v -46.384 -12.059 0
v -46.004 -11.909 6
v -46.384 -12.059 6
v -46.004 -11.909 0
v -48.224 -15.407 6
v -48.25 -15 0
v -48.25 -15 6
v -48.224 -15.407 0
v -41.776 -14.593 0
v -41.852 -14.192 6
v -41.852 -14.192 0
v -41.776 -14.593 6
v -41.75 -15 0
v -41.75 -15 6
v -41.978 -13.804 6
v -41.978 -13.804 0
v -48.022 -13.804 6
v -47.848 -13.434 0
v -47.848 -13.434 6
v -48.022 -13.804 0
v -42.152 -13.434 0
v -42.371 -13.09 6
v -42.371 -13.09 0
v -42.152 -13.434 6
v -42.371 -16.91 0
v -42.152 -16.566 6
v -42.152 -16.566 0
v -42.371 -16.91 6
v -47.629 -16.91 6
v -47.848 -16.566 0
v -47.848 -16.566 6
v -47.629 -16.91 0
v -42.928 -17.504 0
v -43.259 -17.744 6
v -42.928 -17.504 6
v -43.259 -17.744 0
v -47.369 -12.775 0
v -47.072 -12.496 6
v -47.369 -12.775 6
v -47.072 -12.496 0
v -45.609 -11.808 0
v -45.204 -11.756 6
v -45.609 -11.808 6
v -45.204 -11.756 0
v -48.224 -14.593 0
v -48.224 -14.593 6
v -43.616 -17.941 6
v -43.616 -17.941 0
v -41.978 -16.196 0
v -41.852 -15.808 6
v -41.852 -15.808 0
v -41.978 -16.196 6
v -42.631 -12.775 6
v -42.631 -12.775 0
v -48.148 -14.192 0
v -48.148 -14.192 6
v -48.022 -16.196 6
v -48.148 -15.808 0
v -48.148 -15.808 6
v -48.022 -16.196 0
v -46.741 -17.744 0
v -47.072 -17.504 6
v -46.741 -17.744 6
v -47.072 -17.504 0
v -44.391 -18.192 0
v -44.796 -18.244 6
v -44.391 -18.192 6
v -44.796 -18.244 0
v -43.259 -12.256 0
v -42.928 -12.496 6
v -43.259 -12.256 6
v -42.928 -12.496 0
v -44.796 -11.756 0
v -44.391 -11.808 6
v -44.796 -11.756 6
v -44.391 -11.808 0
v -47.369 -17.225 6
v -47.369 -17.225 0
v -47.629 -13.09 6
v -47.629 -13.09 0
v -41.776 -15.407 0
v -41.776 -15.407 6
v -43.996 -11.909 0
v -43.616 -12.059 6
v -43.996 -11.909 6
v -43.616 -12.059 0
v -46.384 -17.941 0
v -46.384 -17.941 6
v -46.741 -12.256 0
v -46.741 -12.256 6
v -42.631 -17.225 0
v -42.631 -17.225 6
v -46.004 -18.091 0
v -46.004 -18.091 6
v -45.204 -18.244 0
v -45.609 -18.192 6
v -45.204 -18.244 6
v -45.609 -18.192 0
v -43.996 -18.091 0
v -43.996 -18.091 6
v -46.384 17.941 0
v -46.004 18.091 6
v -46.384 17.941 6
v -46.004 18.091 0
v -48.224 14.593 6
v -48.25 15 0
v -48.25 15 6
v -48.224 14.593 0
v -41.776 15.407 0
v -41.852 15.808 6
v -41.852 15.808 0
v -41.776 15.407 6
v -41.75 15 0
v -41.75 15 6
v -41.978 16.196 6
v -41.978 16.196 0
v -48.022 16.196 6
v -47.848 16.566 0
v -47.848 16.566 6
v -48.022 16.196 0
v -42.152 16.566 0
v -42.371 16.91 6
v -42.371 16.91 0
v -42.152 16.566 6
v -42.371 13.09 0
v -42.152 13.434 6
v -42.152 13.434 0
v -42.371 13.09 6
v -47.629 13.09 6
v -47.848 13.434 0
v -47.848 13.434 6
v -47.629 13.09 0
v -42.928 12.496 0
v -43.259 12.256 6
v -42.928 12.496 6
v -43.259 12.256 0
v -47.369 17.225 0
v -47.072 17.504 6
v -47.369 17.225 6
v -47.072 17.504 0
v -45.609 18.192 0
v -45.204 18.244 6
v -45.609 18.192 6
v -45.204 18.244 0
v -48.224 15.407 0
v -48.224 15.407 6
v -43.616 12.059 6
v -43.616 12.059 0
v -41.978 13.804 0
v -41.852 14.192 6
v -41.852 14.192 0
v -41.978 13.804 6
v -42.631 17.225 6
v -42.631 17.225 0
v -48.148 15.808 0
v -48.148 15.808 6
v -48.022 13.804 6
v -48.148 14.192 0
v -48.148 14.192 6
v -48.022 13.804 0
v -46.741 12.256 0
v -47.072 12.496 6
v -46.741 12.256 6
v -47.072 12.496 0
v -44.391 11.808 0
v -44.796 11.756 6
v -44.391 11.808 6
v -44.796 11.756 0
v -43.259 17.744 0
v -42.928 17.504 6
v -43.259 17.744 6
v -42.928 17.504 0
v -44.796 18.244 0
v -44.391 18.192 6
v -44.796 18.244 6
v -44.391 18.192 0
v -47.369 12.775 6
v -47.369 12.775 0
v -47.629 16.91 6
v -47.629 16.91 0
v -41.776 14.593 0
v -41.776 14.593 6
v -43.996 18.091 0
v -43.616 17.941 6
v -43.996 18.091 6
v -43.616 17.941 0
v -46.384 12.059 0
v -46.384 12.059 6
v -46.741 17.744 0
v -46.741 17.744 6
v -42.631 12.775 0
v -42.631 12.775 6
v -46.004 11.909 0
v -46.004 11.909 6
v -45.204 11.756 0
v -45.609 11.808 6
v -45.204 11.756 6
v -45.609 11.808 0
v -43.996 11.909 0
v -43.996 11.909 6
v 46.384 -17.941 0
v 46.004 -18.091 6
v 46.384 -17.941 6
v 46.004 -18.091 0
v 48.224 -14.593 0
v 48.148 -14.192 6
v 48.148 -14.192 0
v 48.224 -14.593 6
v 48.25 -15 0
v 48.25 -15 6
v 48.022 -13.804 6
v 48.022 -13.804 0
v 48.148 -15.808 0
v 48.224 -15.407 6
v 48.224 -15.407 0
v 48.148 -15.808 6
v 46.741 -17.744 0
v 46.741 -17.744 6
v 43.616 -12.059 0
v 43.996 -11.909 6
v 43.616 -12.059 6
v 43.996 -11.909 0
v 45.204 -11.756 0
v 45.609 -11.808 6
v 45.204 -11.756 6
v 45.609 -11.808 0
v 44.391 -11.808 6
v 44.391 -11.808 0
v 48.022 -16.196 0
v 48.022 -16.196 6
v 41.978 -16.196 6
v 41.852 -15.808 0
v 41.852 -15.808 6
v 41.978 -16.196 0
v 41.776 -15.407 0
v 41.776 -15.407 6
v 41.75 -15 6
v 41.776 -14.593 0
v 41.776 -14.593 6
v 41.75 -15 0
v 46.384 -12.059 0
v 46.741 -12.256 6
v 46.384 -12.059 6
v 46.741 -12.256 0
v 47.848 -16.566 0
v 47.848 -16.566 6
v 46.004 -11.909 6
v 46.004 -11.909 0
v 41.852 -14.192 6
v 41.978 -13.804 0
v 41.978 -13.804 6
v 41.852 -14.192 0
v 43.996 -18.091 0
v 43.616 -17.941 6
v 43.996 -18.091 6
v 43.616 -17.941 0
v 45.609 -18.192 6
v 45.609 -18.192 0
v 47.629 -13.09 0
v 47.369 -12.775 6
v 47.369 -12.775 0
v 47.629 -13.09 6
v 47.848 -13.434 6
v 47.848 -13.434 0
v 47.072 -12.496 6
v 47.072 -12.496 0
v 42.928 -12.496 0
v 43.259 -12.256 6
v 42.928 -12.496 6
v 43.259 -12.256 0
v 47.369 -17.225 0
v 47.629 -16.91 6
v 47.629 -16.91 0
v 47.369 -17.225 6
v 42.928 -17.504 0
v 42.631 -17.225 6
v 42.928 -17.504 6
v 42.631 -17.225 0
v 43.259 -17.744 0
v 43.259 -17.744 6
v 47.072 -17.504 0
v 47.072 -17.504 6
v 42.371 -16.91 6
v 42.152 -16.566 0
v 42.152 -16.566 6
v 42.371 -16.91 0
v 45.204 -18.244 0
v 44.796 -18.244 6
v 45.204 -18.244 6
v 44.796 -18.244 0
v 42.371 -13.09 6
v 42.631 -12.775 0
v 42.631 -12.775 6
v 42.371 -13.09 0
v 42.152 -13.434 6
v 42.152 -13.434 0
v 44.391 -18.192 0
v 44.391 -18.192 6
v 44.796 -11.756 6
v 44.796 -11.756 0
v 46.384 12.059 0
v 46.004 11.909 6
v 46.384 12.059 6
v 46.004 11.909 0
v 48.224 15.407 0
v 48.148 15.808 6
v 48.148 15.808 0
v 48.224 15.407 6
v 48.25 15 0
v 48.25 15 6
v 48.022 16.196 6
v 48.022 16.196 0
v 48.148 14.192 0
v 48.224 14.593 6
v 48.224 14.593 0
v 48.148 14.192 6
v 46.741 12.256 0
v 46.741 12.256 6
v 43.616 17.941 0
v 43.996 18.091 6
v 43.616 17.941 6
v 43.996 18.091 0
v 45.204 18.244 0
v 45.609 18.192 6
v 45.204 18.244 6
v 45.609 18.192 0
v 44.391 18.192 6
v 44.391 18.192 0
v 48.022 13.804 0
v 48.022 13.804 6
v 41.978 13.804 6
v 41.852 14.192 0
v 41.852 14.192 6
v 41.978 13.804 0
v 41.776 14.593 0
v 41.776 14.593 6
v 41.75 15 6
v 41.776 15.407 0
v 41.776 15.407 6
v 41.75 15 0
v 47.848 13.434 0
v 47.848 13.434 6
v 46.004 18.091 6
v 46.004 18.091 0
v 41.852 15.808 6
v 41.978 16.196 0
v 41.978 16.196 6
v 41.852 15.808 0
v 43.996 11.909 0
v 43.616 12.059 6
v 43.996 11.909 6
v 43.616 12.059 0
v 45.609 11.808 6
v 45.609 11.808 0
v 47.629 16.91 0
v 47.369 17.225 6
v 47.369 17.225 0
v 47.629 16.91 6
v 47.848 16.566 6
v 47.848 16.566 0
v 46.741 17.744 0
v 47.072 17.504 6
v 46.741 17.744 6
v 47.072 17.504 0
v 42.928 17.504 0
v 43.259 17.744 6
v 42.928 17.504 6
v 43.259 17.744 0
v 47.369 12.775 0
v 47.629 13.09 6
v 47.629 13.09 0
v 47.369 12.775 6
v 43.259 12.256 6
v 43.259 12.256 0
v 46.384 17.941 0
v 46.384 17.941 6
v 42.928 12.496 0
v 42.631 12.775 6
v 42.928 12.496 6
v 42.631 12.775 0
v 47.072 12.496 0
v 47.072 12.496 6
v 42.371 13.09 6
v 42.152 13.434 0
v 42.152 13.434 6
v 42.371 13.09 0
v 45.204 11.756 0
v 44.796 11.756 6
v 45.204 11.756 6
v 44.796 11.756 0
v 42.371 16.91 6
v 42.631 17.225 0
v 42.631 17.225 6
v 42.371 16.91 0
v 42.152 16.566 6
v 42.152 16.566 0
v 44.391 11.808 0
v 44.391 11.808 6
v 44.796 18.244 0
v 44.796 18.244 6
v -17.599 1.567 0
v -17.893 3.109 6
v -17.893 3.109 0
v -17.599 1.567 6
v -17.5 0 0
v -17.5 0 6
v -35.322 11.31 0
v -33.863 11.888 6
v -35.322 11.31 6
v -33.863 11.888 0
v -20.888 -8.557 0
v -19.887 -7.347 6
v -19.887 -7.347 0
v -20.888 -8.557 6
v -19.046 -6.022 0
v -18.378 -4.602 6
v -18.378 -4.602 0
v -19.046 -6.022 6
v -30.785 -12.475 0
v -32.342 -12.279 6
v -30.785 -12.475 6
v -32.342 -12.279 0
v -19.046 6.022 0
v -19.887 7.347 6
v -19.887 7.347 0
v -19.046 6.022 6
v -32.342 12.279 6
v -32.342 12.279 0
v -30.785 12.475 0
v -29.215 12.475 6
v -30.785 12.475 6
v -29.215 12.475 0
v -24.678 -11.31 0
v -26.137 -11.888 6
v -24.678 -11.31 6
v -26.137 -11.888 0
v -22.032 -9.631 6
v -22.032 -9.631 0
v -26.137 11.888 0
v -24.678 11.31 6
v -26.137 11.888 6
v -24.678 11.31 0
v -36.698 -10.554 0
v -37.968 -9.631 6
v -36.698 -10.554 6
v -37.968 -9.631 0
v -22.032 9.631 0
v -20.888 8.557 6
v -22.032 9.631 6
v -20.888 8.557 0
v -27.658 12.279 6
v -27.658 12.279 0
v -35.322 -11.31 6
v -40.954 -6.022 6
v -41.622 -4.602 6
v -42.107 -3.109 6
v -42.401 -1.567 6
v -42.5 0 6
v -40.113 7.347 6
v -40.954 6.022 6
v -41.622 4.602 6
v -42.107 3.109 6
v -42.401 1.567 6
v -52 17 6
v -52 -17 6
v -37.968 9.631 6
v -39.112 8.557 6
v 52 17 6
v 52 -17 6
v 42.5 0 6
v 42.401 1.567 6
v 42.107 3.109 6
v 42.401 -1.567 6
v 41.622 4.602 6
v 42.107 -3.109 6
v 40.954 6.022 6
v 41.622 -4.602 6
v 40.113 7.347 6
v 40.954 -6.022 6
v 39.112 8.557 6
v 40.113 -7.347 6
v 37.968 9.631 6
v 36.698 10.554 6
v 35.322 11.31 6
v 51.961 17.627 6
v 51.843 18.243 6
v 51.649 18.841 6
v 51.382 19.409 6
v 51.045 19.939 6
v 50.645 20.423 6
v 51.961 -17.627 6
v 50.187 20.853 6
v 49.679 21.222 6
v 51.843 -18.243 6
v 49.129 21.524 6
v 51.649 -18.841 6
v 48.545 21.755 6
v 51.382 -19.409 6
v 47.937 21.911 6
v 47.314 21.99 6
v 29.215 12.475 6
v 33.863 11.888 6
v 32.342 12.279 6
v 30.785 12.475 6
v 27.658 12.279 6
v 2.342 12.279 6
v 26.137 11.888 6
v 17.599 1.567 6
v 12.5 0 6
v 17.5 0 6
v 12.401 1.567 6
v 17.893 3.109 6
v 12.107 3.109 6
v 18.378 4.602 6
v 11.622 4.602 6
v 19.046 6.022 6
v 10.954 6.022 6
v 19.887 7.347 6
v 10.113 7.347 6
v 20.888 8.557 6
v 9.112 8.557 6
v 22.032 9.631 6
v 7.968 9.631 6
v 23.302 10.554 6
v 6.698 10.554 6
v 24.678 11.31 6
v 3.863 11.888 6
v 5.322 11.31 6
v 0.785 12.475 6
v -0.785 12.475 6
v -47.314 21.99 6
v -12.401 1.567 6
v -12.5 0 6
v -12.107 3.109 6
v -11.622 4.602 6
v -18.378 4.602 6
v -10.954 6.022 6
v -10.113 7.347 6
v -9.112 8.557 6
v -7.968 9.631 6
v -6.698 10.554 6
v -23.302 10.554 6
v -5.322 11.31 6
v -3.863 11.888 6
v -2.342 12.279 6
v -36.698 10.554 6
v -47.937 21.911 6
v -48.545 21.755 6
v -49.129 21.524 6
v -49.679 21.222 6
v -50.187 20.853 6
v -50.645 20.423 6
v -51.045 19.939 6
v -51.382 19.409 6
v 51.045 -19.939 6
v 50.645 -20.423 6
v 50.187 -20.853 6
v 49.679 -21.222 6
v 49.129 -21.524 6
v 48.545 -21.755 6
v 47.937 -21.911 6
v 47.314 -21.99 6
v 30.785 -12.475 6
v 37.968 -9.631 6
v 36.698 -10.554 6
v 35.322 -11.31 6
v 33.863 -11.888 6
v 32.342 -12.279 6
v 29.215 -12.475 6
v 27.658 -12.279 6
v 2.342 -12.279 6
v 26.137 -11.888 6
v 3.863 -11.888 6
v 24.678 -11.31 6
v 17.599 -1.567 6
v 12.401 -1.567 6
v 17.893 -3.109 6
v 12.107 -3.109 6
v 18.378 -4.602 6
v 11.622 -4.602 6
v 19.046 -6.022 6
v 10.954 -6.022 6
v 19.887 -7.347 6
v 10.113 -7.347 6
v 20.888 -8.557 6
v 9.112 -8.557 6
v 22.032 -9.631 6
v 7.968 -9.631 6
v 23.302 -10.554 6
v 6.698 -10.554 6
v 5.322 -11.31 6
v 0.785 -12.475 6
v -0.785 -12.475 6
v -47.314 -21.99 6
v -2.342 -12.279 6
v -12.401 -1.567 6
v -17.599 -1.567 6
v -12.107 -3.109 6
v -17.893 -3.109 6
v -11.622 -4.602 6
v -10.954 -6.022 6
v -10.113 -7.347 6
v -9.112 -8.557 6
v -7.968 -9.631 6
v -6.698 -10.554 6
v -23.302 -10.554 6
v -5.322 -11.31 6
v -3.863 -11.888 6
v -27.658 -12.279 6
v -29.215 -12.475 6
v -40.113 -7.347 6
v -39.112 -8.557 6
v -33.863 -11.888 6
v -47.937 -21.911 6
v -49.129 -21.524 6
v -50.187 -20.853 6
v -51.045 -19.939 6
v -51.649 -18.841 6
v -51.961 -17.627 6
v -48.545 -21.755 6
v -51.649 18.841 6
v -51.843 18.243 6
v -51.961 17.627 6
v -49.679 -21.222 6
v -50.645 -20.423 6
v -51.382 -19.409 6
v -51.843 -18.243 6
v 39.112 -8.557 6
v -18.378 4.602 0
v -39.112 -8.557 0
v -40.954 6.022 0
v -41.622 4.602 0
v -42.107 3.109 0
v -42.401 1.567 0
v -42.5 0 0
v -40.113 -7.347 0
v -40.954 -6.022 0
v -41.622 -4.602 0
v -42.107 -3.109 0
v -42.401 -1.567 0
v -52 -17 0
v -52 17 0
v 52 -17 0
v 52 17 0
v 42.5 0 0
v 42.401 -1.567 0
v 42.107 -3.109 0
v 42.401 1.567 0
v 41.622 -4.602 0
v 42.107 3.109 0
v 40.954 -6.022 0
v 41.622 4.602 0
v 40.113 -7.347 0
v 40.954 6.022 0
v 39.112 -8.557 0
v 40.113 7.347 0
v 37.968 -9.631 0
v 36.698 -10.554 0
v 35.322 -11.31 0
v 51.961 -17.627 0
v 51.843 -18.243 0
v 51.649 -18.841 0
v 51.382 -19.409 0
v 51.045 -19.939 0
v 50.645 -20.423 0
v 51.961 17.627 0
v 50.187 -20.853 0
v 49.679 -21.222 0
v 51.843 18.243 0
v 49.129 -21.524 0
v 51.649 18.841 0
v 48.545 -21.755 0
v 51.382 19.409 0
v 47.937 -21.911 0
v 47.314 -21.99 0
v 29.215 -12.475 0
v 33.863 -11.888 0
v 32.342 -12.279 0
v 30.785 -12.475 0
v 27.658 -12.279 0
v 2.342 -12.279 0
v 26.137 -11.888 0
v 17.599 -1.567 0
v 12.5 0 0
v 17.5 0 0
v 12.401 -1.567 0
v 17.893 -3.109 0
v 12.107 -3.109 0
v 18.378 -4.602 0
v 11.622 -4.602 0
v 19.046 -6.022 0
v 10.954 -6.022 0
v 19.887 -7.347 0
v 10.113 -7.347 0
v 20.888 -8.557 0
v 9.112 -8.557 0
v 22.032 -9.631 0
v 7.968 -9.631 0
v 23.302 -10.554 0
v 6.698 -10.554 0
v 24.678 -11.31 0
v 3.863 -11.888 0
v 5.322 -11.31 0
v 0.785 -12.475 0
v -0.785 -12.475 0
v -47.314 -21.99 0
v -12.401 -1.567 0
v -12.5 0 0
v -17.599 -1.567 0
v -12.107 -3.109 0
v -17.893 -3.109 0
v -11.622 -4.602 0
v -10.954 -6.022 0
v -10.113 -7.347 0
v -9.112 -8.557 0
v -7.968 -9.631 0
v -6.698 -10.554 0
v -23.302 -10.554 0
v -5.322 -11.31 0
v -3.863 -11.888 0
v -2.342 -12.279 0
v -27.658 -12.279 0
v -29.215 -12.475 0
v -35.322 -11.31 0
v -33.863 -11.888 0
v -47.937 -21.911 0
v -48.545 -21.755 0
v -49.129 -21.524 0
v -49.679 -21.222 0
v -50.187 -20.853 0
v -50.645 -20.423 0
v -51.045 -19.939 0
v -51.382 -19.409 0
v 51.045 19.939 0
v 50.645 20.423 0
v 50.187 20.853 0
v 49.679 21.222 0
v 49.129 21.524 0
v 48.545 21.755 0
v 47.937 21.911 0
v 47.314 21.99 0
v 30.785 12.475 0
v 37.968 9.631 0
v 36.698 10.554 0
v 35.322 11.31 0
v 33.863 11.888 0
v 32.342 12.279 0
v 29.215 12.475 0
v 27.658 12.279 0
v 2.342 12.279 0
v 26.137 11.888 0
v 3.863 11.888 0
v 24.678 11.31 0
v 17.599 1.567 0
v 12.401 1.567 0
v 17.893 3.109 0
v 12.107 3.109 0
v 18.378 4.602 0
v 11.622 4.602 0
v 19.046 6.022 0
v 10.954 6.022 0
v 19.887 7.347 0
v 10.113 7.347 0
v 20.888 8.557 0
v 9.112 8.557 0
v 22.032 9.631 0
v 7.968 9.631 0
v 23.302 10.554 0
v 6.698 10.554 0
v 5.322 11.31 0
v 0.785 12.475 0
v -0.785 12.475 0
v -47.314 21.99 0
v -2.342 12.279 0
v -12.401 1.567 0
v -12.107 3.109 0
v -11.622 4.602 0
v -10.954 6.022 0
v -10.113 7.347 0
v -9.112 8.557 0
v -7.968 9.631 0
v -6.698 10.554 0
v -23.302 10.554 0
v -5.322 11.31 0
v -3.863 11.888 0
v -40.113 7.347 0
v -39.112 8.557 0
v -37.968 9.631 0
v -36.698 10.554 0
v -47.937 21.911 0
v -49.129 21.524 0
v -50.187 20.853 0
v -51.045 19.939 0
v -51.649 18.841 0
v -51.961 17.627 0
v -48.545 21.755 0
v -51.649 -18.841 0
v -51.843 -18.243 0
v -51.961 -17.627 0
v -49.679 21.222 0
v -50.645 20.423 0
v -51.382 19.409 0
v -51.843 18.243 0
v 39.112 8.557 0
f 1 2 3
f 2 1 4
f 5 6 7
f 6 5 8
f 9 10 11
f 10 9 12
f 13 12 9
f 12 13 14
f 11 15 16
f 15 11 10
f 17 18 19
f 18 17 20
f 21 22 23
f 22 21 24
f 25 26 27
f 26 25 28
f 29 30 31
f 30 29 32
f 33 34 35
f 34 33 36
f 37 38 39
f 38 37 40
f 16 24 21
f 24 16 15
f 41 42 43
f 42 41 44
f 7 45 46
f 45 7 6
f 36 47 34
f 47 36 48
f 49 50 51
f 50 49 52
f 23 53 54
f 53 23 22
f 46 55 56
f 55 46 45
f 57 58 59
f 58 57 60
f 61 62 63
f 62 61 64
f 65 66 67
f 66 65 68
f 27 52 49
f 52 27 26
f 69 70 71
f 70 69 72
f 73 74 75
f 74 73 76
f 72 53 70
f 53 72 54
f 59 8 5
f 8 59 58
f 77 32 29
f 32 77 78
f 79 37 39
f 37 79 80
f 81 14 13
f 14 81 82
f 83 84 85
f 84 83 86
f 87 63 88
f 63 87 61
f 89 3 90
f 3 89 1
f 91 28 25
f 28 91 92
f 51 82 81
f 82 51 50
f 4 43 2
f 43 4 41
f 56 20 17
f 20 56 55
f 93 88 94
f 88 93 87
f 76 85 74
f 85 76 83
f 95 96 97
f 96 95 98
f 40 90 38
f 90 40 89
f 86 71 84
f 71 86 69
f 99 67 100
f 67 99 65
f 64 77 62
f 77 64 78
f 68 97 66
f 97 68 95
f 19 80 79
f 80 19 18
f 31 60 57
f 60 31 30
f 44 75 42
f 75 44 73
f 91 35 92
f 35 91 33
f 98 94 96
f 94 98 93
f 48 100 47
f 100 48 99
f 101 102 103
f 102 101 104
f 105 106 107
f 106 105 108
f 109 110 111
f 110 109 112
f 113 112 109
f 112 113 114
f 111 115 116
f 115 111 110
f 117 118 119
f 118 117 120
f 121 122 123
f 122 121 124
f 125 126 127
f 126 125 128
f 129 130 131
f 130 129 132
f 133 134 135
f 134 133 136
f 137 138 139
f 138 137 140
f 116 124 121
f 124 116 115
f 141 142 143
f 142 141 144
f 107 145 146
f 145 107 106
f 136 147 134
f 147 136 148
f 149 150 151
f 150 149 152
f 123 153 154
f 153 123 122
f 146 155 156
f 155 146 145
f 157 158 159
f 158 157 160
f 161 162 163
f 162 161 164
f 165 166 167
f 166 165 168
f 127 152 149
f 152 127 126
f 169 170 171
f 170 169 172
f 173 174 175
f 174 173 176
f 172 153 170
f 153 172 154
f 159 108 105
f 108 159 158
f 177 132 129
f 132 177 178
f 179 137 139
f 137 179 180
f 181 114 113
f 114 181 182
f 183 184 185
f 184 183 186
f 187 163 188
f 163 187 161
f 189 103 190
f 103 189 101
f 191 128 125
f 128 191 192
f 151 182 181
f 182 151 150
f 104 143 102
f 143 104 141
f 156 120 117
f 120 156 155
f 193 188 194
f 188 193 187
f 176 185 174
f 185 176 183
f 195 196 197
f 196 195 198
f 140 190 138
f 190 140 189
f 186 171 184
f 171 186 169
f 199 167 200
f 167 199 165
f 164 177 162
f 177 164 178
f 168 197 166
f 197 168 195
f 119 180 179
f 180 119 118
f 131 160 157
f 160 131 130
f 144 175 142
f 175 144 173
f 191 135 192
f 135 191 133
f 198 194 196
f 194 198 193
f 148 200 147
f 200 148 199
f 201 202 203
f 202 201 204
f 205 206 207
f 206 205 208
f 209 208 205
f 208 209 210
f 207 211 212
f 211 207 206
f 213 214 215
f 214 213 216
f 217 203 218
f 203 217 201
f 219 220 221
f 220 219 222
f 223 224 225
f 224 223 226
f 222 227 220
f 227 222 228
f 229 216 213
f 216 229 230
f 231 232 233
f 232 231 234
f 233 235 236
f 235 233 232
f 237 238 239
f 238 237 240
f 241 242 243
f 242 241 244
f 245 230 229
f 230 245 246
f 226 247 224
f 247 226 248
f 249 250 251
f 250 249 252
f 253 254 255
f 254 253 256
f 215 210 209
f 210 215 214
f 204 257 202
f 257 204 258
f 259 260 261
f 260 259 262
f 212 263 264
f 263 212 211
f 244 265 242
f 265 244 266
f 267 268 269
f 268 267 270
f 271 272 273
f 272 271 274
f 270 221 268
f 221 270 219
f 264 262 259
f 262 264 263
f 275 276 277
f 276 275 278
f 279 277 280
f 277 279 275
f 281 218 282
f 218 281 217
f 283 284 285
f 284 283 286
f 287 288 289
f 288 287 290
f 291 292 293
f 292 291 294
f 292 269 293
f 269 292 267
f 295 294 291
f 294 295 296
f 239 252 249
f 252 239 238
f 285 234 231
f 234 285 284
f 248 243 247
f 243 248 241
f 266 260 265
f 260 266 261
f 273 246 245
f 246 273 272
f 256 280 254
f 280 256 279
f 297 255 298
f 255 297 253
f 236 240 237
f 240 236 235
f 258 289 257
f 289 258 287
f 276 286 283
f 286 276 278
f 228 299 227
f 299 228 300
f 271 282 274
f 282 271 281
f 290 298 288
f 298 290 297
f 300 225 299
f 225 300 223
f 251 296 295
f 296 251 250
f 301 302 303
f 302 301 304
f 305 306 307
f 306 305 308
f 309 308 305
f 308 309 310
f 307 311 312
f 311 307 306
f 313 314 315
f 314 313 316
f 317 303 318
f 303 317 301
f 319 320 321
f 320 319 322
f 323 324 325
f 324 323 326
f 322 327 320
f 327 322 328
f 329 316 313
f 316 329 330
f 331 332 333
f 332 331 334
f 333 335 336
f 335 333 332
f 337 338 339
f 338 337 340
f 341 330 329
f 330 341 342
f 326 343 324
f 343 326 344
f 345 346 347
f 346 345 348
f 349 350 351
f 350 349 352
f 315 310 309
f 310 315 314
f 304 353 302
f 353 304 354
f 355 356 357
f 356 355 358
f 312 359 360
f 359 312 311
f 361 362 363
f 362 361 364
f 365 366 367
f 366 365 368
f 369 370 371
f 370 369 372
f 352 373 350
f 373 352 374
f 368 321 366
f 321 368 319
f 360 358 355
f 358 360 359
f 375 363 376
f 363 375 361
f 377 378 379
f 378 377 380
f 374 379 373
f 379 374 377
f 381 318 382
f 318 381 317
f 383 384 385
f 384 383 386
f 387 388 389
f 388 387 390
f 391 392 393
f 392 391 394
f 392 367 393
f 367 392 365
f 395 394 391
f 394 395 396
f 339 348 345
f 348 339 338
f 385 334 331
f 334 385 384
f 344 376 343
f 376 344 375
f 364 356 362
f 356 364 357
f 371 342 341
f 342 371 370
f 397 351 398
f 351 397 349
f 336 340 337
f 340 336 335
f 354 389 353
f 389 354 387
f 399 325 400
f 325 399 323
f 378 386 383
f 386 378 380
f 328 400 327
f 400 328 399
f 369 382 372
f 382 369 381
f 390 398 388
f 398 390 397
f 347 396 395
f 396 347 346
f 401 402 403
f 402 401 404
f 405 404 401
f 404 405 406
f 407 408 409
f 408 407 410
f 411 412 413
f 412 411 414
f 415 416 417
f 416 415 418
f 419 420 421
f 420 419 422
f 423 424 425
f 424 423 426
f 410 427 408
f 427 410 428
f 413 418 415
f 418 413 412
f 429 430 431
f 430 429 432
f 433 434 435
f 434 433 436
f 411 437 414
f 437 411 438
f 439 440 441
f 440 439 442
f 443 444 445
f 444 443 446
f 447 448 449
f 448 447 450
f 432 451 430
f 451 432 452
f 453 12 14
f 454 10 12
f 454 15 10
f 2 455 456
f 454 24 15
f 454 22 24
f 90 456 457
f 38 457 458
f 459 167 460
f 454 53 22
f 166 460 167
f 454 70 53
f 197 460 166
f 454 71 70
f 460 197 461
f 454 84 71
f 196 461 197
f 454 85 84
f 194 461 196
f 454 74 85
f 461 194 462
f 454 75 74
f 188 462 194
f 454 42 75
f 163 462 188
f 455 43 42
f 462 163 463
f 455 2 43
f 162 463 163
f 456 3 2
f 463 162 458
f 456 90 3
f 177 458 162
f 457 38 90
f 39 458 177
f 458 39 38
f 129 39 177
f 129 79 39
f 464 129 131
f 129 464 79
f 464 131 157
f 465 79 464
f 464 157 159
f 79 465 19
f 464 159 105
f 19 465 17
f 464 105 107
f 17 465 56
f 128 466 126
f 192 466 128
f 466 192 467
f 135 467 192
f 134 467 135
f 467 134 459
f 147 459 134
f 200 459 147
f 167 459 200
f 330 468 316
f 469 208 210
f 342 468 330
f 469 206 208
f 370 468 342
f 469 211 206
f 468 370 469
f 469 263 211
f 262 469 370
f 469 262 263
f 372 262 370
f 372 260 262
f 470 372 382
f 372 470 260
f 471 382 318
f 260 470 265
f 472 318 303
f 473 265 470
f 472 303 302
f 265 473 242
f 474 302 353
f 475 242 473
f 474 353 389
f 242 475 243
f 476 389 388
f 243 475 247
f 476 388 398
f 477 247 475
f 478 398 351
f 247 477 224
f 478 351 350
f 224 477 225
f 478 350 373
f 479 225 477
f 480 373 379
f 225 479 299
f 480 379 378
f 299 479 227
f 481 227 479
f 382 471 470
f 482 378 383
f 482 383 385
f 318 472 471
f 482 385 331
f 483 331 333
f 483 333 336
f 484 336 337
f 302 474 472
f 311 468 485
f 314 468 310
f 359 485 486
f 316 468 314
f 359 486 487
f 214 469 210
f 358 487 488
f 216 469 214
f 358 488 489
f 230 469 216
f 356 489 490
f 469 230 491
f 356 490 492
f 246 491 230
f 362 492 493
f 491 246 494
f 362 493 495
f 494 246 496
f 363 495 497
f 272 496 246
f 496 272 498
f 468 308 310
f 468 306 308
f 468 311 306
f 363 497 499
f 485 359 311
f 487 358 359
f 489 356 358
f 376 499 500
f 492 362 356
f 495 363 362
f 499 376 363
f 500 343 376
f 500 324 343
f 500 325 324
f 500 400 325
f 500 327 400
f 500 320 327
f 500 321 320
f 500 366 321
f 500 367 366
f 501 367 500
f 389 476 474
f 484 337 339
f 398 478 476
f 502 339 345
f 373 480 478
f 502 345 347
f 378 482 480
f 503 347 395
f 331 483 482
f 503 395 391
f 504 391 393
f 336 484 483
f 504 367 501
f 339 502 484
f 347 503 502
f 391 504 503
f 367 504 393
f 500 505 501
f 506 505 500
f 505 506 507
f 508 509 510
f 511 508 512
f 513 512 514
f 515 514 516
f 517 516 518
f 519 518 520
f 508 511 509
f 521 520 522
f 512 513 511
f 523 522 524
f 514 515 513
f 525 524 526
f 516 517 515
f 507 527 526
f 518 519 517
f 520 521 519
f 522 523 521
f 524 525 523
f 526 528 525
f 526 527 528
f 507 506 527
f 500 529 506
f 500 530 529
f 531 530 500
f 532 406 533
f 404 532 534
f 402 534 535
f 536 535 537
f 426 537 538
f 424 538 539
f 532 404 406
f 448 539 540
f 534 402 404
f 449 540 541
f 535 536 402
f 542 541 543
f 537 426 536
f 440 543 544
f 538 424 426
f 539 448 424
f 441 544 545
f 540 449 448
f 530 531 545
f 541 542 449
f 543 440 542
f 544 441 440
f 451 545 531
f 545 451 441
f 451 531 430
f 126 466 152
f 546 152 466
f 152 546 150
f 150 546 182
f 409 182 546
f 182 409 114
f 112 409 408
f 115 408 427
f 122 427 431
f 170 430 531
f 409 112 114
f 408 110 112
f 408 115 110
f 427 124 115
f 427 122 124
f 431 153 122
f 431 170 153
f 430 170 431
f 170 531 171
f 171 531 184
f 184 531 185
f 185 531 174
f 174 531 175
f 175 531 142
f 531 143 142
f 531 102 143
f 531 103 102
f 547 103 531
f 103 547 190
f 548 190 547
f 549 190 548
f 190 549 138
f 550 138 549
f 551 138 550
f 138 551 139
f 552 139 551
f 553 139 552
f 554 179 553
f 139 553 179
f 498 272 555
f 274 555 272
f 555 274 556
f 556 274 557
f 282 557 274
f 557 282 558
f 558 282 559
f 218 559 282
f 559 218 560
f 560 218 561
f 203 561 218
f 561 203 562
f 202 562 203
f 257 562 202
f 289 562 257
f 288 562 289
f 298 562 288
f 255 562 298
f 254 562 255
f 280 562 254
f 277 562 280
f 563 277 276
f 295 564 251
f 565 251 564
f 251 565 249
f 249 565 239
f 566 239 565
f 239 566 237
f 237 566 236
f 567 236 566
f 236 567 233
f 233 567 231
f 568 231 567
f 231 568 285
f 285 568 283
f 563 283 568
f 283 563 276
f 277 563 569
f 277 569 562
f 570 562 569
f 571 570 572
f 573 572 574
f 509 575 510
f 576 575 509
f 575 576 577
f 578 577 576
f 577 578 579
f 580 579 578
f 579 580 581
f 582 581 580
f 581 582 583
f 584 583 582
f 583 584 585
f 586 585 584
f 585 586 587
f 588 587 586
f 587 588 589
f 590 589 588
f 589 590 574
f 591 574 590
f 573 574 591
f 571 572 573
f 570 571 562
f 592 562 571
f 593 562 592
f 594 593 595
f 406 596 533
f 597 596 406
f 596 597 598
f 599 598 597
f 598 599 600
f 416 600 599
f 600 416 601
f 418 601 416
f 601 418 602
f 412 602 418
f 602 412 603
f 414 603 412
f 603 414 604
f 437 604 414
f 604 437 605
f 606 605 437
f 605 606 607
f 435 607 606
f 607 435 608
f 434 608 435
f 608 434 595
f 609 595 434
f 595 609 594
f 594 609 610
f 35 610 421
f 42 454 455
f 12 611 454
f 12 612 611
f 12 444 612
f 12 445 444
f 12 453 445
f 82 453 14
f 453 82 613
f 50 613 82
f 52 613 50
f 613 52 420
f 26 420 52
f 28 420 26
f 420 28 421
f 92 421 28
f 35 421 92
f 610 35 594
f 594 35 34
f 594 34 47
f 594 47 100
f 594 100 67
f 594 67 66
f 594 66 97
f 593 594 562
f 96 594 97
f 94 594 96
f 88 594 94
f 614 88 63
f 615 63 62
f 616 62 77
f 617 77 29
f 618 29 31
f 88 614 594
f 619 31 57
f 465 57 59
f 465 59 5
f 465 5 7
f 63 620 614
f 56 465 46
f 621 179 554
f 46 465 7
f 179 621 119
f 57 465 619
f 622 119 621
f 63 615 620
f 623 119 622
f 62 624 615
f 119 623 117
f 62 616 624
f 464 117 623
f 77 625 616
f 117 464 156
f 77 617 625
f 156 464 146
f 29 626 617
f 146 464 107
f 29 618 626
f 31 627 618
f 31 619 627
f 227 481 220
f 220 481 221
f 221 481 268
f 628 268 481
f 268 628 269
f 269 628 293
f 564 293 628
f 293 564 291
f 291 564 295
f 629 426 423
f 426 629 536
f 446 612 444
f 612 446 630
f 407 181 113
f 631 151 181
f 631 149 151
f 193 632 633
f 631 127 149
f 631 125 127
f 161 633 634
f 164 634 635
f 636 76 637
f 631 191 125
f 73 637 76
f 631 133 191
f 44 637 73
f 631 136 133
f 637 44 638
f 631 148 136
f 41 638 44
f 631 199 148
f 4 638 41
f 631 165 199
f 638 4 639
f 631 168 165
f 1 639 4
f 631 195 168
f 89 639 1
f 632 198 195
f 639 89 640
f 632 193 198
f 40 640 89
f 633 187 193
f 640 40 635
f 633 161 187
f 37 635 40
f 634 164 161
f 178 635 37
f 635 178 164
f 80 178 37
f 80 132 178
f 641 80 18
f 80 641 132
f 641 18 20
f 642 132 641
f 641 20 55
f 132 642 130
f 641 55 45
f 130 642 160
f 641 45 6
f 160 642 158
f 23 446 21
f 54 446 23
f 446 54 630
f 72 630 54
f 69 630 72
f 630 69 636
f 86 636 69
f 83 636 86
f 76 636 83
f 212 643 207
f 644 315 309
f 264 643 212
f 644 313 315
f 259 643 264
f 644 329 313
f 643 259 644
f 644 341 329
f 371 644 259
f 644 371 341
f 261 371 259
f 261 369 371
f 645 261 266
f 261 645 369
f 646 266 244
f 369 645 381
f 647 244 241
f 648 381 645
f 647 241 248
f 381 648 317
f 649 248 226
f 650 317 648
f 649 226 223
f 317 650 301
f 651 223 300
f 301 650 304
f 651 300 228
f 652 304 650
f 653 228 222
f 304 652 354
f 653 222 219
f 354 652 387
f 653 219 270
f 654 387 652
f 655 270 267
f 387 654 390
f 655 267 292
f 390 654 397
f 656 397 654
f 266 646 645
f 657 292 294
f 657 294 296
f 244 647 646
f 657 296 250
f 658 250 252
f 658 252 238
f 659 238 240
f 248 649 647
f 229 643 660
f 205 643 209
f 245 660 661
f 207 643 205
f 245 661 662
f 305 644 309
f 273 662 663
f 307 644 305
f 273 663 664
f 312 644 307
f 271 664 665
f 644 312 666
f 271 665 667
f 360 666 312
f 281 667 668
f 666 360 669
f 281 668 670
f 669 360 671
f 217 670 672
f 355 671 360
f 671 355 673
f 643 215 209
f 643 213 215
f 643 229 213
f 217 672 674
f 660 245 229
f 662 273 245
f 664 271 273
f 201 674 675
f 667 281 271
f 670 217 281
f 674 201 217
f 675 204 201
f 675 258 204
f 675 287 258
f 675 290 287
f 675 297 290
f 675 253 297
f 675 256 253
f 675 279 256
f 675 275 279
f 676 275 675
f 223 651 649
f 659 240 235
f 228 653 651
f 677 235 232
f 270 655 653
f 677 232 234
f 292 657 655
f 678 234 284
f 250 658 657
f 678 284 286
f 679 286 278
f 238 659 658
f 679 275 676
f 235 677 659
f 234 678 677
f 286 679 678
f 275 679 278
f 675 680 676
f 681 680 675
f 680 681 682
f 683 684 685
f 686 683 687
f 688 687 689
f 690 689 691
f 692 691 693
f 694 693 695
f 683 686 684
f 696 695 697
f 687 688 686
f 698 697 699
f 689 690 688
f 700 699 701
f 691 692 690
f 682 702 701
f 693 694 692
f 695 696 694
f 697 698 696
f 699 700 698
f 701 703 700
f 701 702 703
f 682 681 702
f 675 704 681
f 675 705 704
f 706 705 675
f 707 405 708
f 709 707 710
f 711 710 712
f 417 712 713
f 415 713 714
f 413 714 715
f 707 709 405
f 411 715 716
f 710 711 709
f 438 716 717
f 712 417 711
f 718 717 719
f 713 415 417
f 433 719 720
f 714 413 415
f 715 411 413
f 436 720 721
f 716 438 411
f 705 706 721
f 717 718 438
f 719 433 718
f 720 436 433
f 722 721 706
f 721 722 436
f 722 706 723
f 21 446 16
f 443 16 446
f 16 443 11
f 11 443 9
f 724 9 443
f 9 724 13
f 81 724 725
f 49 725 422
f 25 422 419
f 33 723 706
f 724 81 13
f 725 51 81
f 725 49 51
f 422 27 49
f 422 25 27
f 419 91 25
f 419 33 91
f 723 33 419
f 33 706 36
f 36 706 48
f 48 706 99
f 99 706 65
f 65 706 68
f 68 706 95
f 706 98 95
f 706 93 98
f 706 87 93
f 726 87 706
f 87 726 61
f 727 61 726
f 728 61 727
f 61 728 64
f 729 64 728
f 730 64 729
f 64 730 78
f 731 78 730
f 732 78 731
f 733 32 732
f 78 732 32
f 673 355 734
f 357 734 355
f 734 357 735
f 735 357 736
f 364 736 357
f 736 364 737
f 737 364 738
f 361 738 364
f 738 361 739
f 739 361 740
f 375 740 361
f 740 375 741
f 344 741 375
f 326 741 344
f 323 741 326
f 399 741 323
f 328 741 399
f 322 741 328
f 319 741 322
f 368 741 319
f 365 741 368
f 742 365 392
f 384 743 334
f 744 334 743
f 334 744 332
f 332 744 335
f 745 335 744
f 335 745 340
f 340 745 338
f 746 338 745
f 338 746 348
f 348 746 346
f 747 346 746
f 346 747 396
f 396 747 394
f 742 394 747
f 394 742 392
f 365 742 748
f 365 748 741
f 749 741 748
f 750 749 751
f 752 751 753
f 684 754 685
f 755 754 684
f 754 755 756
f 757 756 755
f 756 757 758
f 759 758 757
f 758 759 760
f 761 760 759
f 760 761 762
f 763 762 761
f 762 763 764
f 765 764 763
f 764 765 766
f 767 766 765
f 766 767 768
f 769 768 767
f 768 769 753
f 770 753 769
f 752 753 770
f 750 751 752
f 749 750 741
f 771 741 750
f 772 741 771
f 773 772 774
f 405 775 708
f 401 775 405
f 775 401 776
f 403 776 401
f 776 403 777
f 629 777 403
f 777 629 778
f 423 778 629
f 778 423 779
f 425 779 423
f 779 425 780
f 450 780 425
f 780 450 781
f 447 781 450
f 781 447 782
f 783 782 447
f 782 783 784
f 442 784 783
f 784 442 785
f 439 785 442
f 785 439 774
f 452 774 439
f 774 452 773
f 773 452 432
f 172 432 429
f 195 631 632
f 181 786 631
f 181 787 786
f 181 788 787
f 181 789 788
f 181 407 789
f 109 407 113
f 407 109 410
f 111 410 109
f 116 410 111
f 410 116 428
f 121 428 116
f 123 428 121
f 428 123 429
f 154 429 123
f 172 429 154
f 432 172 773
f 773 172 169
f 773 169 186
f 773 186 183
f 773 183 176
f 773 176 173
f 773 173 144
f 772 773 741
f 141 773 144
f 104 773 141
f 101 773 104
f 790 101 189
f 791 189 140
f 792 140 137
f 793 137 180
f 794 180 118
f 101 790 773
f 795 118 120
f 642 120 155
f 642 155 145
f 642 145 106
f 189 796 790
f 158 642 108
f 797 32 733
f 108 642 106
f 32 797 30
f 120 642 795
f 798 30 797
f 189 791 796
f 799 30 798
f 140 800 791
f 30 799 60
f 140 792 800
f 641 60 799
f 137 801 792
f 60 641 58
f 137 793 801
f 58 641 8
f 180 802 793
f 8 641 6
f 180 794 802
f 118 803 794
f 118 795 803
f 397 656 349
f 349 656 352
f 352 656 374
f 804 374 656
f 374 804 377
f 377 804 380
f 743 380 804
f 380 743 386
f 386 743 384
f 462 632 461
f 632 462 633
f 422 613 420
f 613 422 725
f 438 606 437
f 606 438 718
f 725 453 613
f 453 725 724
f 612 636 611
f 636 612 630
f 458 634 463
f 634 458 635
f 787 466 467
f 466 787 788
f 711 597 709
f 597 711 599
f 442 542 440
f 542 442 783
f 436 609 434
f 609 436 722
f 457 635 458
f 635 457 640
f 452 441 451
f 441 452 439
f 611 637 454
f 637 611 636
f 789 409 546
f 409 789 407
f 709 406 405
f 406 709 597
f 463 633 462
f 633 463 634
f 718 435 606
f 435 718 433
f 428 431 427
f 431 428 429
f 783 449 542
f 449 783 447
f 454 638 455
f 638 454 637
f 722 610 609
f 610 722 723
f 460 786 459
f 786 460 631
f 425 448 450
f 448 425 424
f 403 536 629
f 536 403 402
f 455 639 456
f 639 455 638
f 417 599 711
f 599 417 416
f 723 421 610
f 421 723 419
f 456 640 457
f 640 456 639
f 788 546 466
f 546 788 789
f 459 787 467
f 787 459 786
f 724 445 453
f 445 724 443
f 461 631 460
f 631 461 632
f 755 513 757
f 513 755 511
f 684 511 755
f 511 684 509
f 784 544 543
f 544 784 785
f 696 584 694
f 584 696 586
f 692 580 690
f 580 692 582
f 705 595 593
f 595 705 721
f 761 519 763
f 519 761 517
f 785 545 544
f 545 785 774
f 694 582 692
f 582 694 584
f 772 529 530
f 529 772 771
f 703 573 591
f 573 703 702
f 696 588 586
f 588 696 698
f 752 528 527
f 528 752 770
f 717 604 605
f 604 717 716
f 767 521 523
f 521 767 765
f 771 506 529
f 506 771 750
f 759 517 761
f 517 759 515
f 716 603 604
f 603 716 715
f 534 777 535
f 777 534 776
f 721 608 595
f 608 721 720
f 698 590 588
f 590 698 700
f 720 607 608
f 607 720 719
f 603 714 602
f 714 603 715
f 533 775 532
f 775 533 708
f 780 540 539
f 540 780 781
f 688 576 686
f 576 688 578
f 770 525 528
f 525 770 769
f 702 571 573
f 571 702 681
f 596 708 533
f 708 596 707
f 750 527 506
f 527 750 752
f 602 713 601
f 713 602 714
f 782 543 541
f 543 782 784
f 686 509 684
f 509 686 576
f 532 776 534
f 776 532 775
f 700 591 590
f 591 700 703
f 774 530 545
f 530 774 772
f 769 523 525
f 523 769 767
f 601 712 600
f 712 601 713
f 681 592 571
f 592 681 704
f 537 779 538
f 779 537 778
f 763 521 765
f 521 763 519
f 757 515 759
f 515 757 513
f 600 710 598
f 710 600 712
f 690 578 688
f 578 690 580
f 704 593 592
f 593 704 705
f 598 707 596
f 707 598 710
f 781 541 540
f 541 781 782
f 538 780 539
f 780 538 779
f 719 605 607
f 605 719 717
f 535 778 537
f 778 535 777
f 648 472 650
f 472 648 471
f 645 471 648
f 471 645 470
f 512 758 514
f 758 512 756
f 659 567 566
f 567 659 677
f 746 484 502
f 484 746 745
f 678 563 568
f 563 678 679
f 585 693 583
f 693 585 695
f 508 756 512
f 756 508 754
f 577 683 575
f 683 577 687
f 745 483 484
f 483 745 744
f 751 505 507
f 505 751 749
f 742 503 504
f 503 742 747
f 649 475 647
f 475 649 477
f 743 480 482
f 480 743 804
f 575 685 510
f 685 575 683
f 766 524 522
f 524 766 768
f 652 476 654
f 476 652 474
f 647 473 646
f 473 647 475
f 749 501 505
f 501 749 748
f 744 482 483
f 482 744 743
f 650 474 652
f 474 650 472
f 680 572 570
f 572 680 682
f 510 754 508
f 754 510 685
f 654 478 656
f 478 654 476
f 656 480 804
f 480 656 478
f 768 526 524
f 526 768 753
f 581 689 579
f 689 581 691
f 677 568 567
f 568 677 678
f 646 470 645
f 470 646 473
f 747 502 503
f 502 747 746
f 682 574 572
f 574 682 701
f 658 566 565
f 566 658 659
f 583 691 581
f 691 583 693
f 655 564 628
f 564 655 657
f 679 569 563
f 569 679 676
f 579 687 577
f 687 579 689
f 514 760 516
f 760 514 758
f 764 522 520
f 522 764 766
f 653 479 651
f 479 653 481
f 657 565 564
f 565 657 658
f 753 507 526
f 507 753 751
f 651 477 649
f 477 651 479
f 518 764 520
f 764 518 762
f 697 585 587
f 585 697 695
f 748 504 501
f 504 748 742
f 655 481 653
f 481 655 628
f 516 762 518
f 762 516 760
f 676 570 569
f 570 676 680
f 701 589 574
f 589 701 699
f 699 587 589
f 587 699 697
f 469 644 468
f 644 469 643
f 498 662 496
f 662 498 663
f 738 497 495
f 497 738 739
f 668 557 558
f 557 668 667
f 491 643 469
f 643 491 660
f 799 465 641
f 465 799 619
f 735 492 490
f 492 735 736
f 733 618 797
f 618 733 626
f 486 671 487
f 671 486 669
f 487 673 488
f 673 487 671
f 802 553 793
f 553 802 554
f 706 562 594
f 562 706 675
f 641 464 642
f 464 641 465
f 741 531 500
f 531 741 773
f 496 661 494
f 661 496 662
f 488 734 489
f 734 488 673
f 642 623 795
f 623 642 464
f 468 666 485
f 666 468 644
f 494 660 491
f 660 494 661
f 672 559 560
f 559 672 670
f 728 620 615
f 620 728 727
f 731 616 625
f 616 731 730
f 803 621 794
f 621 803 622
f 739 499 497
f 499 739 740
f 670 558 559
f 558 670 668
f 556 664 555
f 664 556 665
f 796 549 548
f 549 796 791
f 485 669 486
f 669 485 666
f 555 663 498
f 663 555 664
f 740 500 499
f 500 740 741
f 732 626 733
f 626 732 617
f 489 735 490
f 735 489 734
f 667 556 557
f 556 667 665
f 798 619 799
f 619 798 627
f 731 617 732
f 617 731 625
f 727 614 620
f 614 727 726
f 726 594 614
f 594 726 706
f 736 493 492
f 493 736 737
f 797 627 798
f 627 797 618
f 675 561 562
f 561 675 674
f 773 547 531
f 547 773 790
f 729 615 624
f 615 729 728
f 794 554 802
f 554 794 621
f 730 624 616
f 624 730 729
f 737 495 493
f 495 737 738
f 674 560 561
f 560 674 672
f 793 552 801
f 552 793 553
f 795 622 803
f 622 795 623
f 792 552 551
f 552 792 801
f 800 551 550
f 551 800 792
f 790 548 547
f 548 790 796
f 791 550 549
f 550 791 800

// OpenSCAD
$fn = 50;


difference() {
	union() {
		hull() {
			translate(v = [-47.0000000000, 17.0000000000, 0]) {
				cylinder(h = 6, r = 5);
			}
			translate(v = [47.0000000000, 17.0000000000, 0]) {
				cylinder(h = 6, r = 5);
			}
			translate(v = [-47.0000000000, -17.0000000000, 0]) {
				cylinder(h = 6, r = 5);
			}
			translate(v = [47.0000000000, -17.0000000000, 0]) {
				cylinder(h = 6, r = 5);
			}
		}
	}
	union() {
		#translate(v = [-45.0000000000, -15.0000000000, -100.0000000000]) {
			cylinder(h = 200, r = 3.2500000000);
		}
		#translate(v = [-45.0000000000, 15.0000000000, -100.0000000000]) {
			cylinder(h = 200, r = 3.2500000000);
		}
		#translate(v = [45.0000000000, -15.0000000000, -100.0000000000]) {
			cylinder(h = 200, r = 3.2500000000);
		}
		#translate(v = [45.0000000000, 15.0000000000, -100.0000000000]) {
			cylinder(h = 200, r = 3.2500000000);
		}
		#translate(v = [-30.0000000000, 0, 0]) {
			cylinder(h = 6, r = 12.5000000000);
		}
		#cylinder(h = 6, r = 12.5000000000);
		#translate(v = [30.0000000000, 0, 0]) {
			cylinder(h = 6, r = 12.5000000000);
		}
	}
}
